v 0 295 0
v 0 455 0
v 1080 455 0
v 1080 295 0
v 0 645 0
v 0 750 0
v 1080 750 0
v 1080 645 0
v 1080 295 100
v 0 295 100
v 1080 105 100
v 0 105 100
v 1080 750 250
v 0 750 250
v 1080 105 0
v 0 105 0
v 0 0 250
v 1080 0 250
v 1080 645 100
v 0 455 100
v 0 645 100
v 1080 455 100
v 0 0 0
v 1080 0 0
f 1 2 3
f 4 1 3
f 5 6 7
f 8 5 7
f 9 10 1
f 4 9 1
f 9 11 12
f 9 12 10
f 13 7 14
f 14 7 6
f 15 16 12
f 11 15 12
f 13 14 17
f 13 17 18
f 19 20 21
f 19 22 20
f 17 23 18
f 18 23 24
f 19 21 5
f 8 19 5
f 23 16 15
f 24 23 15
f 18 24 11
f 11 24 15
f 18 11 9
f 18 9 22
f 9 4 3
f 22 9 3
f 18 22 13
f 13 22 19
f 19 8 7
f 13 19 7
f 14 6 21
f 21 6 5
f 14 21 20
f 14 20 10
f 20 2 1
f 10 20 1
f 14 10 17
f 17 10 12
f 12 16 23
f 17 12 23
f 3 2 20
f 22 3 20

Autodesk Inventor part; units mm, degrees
ref_plane "YZ Plane" through (0, 0, 0) normal (1, 0, 0) x (0, 1, 0)
ref_plane "XZ Plane" through (0, 0, 0) normal (0, 1, 0) x (-1, 0, 0)
ref_plane "XY Plane" through (0, 0, 0) normal (0, 0, 1) x (1, 0, 0)
sketch "Wireframe" plane through (0, 0, 0) normal (0, 0, 1) x (1, 0, 0)
  line L0 (0, 0) -> (1080, 0)
  line L1 (1080, 0) -> (1080, 750)
  line L2 (1080, 750) -> (0, 750)
  line L3 (0, 750) -> (0, 0)
  dimension "d0" = 1080
  dimension "d1" = 750
extrude "Extrusion1" add sketch "Wireframe" along normal blind 250
sketch "Sketch4" plane through (1080, 0, 0) normal (1, 0, 0) x (0, 0, -1)
  line L0 (0, 0) -> (0, 750) projected
  line L1 (0, 0) -> (0, 149.657)
  line L2 (0, 0) -> (0, 105)
  line L3 (0, 0) -> (105, 0) construction
  line L4 (0, 105) -> (-100, 105)
  line L5 (-100, 105) -> (-100, 295)
  line L6 (-100, 295) -> (0, 295)
  line L7 (0, 295) -> (0, 455)
  line L8 (0, 455) -> (-100, 455)
  line L9 (-100, 455) -> (-100, 645)
  line L10 (-100, 645) -> (0, 645)
  line L11 (0, 645) -> (0, 750)
  dimension "d8" = 105
  dimension "d9" = 90
  dimension "d10" = 100
  dimension "d11" = 190
  dimension "d12" = 100
  dimension "d13" = 160
  dimension "d14" = 100
  dimension "d15" = 190
  dimension "d16" = 100
extrude "Extrusion2" cut sketch "Sketch4" against normal up to next contours L8 L9 L10 L0
sketch "Sketch5" plane through (1080, 0, 250) normal (1, 0, 0) x (0, 0, -1)
  line L0 (250, 0) -> (250, 105)
  line L1 (250, 0) -> (250, 455) projected
  line L2 (250, 105) -> (150, 105)
  line L3 (150, 105) -> (150, 295)
  line L4 (150, 295) -> (250, 295)
  dimension "d19" = 105
  dimension "d20" = 100
  dimension "d21" = 190
  dimension "d22" = 100
extrude "Extrusion3" cut sketch "Sketch5" against normal up to next
properties part number "GraniteEpoxyBase" material "Concrete"
